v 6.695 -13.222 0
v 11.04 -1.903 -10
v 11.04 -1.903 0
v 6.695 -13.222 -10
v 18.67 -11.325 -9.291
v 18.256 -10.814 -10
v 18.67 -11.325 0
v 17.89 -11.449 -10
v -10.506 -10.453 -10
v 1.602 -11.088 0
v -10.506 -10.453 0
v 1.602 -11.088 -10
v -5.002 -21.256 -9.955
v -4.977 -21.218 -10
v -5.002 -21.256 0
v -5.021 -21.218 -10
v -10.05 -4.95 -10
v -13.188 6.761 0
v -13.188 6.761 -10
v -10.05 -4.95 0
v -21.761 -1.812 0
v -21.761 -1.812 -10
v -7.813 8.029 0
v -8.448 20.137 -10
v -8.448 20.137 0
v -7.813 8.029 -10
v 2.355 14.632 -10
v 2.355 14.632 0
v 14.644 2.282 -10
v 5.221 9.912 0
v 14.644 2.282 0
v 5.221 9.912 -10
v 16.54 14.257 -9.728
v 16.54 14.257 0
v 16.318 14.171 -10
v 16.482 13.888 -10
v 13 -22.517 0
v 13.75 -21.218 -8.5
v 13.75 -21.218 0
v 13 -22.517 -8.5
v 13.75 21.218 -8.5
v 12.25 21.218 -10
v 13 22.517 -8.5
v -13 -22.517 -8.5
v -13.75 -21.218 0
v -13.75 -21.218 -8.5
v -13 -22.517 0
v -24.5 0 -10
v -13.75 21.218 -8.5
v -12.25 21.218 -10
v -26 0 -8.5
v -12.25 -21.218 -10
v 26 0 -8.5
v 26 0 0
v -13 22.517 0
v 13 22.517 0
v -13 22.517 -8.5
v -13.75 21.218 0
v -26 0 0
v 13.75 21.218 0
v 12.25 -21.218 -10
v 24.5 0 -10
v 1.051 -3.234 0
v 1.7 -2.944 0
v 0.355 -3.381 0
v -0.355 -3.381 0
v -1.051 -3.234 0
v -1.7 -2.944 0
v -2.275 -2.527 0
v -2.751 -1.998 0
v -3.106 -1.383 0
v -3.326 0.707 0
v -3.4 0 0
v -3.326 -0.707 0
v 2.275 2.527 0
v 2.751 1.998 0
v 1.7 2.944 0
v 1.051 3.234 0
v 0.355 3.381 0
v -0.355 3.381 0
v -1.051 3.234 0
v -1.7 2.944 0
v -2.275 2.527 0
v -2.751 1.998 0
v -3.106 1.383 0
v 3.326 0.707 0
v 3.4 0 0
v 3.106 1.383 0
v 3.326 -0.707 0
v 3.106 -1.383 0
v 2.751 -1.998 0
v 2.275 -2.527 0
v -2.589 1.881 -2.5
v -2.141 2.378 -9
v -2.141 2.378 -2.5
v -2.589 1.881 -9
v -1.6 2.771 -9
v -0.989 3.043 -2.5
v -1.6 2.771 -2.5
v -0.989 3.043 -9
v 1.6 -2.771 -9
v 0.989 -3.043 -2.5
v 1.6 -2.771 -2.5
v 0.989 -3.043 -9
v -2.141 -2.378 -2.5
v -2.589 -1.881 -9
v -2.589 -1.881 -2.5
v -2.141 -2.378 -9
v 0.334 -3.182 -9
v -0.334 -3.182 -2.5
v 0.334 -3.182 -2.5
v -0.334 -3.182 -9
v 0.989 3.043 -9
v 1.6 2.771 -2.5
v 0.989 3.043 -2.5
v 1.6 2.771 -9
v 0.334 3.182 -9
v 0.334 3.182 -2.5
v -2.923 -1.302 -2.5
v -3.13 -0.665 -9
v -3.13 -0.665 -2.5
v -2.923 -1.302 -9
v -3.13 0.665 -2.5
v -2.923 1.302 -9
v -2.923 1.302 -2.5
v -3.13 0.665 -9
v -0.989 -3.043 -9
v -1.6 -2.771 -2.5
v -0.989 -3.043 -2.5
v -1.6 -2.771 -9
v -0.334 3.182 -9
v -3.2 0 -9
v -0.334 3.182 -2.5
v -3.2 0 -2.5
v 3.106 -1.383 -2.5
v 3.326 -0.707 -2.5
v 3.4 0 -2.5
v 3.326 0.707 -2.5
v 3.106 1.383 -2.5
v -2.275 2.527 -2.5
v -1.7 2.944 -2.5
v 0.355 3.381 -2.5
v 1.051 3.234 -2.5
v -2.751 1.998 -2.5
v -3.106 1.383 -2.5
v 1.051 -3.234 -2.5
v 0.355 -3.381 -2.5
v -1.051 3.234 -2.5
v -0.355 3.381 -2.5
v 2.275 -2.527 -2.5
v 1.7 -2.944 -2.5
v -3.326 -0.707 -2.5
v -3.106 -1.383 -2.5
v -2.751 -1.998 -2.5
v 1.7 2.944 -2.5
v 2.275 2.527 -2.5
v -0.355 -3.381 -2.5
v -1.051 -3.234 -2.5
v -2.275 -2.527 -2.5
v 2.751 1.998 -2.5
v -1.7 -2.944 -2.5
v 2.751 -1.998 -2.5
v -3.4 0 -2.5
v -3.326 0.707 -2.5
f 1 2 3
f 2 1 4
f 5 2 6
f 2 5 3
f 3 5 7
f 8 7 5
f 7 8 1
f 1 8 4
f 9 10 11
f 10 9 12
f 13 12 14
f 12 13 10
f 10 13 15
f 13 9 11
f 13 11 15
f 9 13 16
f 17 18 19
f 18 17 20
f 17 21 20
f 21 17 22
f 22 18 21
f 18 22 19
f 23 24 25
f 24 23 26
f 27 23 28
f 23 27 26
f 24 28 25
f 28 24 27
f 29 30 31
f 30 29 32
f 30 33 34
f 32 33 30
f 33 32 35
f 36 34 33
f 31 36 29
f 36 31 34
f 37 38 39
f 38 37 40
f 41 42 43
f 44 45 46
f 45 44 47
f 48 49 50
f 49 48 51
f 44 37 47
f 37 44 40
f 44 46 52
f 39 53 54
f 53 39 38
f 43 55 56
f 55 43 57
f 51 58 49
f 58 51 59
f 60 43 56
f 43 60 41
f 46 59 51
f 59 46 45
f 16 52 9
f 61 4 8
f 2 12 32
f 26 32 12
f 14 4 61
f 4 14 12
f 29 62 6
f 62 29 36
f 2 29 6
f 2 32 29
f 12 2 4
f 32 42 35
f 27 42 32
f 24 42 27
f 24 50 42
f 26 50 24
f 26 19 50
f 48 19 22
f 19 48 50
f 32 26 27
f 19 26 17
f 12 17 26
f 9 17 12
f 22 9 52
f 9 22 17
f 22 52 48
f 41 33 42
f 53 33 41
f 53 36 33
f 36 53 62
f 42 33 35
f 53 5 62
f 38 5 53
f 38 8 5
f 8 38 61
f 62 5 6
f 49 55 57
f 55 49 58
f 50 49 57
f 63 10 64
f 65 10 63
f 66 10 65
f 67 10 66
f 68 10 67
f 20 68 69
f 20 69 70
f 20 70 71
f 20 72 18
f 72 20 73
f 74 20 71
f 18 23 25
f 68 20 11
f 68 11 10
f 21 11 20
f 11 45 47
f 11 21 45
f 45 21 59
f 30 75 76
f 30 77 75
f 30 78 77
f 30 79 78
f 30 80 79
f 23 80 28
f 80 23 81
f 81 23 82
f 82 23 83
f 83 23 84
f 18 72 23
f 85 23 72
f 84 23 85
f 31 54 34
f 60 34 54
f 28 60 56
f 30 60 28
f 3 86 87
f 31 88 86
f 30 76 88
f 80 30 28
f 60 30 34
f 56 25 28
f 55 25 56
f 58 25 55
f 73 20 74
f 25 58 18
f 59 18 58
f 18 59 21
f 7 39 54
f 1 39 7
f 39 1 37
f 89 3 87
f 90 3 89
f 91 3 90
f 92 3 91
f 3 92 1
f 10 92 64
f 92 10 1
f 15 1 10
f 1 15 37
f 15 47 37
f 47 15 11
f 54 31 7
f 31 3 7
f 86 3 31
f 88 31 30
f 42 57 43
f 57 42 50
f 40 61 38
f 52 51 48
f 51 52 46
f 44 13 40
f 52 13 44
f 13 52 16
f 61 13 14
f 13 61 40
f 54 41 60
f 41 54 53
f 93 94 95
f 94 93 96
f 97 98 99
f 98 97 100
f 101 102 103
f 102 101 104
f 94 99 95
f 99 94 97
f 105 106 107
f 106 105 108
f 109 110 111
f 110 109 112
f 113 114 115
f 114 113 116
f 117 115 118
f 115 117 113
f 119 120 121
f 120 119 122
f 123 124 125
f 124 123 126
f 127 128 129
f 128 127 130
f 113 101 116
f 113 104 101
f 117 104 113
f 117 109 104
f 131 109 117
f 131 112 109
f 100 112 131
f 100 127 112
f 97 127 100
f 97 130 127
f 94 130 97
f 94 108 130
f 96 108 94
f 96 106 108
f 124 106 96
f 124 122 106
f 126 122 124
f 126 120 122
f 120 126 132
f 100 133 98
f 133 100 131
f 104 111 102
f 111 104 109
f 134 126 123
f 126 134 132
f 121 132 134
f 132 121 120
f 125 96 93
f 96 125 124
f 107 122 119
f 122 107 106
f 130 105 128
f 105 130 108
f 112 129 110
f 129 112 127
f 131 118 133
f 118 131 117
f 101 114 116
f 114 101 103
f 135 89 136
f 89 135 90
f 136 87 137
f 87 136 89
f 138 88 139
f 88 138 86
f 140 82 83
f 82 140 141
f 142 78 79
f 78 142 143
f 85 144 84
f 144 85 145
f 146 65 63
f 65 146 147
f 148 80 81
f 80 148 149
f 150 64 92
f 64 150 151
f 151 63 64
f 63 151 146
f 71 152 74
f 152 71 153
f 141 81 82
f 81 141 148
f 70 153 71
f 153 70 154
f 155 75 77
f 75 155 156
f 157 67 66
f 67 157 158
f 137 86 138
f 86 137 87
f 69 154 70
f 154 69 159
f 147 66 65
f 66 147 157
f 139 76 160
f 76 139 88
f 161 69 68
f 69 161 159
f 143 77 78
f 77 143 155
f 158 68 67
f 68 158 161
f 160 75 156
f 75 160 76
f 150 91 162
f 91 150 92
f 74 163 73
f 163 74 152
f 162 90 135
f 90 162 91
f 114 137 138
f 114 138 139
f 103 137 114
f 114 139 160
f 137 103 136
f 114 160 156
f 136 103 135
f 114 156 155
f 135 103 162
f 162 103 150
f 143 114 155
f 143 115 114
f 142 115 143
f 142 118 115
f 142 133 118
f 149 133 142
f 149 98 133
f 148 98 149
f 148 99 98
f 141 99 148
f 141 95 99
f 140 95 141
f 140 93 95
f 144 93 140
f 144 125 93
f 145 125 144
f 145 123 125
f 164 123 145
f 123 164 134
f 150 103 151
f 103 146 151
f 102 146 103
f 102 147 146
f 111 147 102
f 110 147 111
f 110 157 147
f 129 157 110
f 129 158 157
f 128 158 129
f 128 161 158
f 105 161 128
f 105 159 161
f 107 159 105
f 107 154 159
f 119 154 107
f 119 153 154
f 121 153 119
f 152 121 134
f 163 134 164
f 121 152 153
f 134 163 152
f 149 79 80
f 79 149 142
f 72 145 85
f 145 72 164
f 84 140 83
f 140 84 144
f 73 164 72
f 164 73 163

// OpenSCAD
/* Knob, originally from raspberry pi fx pedal */

// C = Cylinder, F = Flower
SHAPE = "C";  

// ** Cylinder options OUTER RADIUS
CYLINDER_R_OUTER = 26;  // 14, 22, 25
// 'amount of taper'
ROUNDING_R = 1.5;
C_FN = 6; // 12, 5, 3

C_CUT_NUM = 5;  // often the same as C_FN
C_CUT_R = 7; //radius
C_CUT_OFFSET = 15;  //CYLINDER_R_OUTER+2;
C_CUT_FN = 3; // vertices
C_CUT_SCALE = 1;  // normally 1, scale the cylinder being cut from base, try it out :-)
C_CUT_ANGLE = 105;
// precalculation, do not change
C_ANGLE = 360 / C_CUT_NUM;
C_ANGLE_OFFSET = 0.5 * C_ANGLE;  // 0 or 0.5*C_ANGLE 

// ** Flower options
F_NUM_LEAFS = 3;  // 5, 7, 3
F_LEAF_OFFSET = 20;  // 20, 20, 20
F_LEAF_R_INNER = 5;  // 2.5, 2, 5
F_LEAF_R_OUTER = 2;  // 6, 5, 2
// precalculation, do not change
F_ANGLE = 360 / F_NUM_LEAFS;


// AXLE options

// HEIGHT=13 for 20mm pots/rotary encoders, 10 for 15mm; or through hole, then choose something you like^^
H = 10;

// D for D shape or N for normal
AXLE_TYPE = "D";  

// depth of hole, optionally leave 1 mm on top (H-1) or through hole (H+1)
AXLE_D = H - 1;  
// for D axle hole, there is an extra round part
AXLE_D2 = 2.5;  
// for 6mm axle
AXLE_R = 3.1;

// for 6mm D shaped axle
AXLE_D_R = 3.2;

module pin_d(r, d) {
	translate([0,0,-0.1])
	difference() {
		cylinder(r=r, h=0.1+d, $fn=30);
		translate([1.6,-50,-1])
		cube([100,100,100]);
	}
}

module pin(r, d) {
	translate([0,0,-0.1])
    cylinder(r=r, h=0.1+d, $fn=30);
}


M = [ [ 1, 0, 0, 0 ],
       [ 0, 1, 0.3, 0 ],  // The "0.7" is the skew value; pushed along the y axis
       [ 0, 0, 1, 0 ],
       [ 0, 0, 0, 1 ] ] ;

module base_cylinder() {
    difference() {
	minkowski() {
        //multmatrix(M) {
        //    union() {
		//sphere(r=ROUNDING_R, $fn=12);
		cylinder(r1=ROUNDING_R, r2=0, h=ROUNDING_R, $fn=C_FN);
		cylinder(r=CYLINDER_R_OUTER-ROUNDING_R, h=H-ROUNDING_R, $fn=C_FN);
        //    }
        //}
	}
    for (i=[0:C_CUT_NUM-1]) {
            rotate([0,0,C_ANGLE_OFFSET+C_ANGLE*i])
            translate([C_CUT_OFFSET,0,-0.1])
            rotate([0,0,C_CUT_ANGLE])            
            scale([C_CUT_SCALE,1,1])
        
            //multmatrix(M) {
            //union() {
                cylinder(r=C_CUT_R, h=H+0.2, $fn=C_CUT_FN); }
            //}
        //}
    }
}

module flower() {
    for (i=[0:F_NUM_LEAFS-1]) {
        rotate([0,0,F_ANGLE*i])
        hull() {
            cylinder(r=F_LEAF_R_INNER, h=H);

            translate([F_LEAF_OFFSET,0,0])
            cylinder(r=F_LEAF_R_OUTER, h=H);
        }
    }
}


rotate([180,0,0])
difference() {
    if (SHAPE == "C") {
        base_cylinder();
    } else if (SHAPE == "F") {
        flower();
    }
    if (AXLE_TYPE == "D") {
        pin_d(AXLE_D_R, AXLE_D);
        pin(AXLE_D_R+0.2, AXLE_D2);
    } else {
        pin(AXLE_R, AXLE_D);
    }
}
